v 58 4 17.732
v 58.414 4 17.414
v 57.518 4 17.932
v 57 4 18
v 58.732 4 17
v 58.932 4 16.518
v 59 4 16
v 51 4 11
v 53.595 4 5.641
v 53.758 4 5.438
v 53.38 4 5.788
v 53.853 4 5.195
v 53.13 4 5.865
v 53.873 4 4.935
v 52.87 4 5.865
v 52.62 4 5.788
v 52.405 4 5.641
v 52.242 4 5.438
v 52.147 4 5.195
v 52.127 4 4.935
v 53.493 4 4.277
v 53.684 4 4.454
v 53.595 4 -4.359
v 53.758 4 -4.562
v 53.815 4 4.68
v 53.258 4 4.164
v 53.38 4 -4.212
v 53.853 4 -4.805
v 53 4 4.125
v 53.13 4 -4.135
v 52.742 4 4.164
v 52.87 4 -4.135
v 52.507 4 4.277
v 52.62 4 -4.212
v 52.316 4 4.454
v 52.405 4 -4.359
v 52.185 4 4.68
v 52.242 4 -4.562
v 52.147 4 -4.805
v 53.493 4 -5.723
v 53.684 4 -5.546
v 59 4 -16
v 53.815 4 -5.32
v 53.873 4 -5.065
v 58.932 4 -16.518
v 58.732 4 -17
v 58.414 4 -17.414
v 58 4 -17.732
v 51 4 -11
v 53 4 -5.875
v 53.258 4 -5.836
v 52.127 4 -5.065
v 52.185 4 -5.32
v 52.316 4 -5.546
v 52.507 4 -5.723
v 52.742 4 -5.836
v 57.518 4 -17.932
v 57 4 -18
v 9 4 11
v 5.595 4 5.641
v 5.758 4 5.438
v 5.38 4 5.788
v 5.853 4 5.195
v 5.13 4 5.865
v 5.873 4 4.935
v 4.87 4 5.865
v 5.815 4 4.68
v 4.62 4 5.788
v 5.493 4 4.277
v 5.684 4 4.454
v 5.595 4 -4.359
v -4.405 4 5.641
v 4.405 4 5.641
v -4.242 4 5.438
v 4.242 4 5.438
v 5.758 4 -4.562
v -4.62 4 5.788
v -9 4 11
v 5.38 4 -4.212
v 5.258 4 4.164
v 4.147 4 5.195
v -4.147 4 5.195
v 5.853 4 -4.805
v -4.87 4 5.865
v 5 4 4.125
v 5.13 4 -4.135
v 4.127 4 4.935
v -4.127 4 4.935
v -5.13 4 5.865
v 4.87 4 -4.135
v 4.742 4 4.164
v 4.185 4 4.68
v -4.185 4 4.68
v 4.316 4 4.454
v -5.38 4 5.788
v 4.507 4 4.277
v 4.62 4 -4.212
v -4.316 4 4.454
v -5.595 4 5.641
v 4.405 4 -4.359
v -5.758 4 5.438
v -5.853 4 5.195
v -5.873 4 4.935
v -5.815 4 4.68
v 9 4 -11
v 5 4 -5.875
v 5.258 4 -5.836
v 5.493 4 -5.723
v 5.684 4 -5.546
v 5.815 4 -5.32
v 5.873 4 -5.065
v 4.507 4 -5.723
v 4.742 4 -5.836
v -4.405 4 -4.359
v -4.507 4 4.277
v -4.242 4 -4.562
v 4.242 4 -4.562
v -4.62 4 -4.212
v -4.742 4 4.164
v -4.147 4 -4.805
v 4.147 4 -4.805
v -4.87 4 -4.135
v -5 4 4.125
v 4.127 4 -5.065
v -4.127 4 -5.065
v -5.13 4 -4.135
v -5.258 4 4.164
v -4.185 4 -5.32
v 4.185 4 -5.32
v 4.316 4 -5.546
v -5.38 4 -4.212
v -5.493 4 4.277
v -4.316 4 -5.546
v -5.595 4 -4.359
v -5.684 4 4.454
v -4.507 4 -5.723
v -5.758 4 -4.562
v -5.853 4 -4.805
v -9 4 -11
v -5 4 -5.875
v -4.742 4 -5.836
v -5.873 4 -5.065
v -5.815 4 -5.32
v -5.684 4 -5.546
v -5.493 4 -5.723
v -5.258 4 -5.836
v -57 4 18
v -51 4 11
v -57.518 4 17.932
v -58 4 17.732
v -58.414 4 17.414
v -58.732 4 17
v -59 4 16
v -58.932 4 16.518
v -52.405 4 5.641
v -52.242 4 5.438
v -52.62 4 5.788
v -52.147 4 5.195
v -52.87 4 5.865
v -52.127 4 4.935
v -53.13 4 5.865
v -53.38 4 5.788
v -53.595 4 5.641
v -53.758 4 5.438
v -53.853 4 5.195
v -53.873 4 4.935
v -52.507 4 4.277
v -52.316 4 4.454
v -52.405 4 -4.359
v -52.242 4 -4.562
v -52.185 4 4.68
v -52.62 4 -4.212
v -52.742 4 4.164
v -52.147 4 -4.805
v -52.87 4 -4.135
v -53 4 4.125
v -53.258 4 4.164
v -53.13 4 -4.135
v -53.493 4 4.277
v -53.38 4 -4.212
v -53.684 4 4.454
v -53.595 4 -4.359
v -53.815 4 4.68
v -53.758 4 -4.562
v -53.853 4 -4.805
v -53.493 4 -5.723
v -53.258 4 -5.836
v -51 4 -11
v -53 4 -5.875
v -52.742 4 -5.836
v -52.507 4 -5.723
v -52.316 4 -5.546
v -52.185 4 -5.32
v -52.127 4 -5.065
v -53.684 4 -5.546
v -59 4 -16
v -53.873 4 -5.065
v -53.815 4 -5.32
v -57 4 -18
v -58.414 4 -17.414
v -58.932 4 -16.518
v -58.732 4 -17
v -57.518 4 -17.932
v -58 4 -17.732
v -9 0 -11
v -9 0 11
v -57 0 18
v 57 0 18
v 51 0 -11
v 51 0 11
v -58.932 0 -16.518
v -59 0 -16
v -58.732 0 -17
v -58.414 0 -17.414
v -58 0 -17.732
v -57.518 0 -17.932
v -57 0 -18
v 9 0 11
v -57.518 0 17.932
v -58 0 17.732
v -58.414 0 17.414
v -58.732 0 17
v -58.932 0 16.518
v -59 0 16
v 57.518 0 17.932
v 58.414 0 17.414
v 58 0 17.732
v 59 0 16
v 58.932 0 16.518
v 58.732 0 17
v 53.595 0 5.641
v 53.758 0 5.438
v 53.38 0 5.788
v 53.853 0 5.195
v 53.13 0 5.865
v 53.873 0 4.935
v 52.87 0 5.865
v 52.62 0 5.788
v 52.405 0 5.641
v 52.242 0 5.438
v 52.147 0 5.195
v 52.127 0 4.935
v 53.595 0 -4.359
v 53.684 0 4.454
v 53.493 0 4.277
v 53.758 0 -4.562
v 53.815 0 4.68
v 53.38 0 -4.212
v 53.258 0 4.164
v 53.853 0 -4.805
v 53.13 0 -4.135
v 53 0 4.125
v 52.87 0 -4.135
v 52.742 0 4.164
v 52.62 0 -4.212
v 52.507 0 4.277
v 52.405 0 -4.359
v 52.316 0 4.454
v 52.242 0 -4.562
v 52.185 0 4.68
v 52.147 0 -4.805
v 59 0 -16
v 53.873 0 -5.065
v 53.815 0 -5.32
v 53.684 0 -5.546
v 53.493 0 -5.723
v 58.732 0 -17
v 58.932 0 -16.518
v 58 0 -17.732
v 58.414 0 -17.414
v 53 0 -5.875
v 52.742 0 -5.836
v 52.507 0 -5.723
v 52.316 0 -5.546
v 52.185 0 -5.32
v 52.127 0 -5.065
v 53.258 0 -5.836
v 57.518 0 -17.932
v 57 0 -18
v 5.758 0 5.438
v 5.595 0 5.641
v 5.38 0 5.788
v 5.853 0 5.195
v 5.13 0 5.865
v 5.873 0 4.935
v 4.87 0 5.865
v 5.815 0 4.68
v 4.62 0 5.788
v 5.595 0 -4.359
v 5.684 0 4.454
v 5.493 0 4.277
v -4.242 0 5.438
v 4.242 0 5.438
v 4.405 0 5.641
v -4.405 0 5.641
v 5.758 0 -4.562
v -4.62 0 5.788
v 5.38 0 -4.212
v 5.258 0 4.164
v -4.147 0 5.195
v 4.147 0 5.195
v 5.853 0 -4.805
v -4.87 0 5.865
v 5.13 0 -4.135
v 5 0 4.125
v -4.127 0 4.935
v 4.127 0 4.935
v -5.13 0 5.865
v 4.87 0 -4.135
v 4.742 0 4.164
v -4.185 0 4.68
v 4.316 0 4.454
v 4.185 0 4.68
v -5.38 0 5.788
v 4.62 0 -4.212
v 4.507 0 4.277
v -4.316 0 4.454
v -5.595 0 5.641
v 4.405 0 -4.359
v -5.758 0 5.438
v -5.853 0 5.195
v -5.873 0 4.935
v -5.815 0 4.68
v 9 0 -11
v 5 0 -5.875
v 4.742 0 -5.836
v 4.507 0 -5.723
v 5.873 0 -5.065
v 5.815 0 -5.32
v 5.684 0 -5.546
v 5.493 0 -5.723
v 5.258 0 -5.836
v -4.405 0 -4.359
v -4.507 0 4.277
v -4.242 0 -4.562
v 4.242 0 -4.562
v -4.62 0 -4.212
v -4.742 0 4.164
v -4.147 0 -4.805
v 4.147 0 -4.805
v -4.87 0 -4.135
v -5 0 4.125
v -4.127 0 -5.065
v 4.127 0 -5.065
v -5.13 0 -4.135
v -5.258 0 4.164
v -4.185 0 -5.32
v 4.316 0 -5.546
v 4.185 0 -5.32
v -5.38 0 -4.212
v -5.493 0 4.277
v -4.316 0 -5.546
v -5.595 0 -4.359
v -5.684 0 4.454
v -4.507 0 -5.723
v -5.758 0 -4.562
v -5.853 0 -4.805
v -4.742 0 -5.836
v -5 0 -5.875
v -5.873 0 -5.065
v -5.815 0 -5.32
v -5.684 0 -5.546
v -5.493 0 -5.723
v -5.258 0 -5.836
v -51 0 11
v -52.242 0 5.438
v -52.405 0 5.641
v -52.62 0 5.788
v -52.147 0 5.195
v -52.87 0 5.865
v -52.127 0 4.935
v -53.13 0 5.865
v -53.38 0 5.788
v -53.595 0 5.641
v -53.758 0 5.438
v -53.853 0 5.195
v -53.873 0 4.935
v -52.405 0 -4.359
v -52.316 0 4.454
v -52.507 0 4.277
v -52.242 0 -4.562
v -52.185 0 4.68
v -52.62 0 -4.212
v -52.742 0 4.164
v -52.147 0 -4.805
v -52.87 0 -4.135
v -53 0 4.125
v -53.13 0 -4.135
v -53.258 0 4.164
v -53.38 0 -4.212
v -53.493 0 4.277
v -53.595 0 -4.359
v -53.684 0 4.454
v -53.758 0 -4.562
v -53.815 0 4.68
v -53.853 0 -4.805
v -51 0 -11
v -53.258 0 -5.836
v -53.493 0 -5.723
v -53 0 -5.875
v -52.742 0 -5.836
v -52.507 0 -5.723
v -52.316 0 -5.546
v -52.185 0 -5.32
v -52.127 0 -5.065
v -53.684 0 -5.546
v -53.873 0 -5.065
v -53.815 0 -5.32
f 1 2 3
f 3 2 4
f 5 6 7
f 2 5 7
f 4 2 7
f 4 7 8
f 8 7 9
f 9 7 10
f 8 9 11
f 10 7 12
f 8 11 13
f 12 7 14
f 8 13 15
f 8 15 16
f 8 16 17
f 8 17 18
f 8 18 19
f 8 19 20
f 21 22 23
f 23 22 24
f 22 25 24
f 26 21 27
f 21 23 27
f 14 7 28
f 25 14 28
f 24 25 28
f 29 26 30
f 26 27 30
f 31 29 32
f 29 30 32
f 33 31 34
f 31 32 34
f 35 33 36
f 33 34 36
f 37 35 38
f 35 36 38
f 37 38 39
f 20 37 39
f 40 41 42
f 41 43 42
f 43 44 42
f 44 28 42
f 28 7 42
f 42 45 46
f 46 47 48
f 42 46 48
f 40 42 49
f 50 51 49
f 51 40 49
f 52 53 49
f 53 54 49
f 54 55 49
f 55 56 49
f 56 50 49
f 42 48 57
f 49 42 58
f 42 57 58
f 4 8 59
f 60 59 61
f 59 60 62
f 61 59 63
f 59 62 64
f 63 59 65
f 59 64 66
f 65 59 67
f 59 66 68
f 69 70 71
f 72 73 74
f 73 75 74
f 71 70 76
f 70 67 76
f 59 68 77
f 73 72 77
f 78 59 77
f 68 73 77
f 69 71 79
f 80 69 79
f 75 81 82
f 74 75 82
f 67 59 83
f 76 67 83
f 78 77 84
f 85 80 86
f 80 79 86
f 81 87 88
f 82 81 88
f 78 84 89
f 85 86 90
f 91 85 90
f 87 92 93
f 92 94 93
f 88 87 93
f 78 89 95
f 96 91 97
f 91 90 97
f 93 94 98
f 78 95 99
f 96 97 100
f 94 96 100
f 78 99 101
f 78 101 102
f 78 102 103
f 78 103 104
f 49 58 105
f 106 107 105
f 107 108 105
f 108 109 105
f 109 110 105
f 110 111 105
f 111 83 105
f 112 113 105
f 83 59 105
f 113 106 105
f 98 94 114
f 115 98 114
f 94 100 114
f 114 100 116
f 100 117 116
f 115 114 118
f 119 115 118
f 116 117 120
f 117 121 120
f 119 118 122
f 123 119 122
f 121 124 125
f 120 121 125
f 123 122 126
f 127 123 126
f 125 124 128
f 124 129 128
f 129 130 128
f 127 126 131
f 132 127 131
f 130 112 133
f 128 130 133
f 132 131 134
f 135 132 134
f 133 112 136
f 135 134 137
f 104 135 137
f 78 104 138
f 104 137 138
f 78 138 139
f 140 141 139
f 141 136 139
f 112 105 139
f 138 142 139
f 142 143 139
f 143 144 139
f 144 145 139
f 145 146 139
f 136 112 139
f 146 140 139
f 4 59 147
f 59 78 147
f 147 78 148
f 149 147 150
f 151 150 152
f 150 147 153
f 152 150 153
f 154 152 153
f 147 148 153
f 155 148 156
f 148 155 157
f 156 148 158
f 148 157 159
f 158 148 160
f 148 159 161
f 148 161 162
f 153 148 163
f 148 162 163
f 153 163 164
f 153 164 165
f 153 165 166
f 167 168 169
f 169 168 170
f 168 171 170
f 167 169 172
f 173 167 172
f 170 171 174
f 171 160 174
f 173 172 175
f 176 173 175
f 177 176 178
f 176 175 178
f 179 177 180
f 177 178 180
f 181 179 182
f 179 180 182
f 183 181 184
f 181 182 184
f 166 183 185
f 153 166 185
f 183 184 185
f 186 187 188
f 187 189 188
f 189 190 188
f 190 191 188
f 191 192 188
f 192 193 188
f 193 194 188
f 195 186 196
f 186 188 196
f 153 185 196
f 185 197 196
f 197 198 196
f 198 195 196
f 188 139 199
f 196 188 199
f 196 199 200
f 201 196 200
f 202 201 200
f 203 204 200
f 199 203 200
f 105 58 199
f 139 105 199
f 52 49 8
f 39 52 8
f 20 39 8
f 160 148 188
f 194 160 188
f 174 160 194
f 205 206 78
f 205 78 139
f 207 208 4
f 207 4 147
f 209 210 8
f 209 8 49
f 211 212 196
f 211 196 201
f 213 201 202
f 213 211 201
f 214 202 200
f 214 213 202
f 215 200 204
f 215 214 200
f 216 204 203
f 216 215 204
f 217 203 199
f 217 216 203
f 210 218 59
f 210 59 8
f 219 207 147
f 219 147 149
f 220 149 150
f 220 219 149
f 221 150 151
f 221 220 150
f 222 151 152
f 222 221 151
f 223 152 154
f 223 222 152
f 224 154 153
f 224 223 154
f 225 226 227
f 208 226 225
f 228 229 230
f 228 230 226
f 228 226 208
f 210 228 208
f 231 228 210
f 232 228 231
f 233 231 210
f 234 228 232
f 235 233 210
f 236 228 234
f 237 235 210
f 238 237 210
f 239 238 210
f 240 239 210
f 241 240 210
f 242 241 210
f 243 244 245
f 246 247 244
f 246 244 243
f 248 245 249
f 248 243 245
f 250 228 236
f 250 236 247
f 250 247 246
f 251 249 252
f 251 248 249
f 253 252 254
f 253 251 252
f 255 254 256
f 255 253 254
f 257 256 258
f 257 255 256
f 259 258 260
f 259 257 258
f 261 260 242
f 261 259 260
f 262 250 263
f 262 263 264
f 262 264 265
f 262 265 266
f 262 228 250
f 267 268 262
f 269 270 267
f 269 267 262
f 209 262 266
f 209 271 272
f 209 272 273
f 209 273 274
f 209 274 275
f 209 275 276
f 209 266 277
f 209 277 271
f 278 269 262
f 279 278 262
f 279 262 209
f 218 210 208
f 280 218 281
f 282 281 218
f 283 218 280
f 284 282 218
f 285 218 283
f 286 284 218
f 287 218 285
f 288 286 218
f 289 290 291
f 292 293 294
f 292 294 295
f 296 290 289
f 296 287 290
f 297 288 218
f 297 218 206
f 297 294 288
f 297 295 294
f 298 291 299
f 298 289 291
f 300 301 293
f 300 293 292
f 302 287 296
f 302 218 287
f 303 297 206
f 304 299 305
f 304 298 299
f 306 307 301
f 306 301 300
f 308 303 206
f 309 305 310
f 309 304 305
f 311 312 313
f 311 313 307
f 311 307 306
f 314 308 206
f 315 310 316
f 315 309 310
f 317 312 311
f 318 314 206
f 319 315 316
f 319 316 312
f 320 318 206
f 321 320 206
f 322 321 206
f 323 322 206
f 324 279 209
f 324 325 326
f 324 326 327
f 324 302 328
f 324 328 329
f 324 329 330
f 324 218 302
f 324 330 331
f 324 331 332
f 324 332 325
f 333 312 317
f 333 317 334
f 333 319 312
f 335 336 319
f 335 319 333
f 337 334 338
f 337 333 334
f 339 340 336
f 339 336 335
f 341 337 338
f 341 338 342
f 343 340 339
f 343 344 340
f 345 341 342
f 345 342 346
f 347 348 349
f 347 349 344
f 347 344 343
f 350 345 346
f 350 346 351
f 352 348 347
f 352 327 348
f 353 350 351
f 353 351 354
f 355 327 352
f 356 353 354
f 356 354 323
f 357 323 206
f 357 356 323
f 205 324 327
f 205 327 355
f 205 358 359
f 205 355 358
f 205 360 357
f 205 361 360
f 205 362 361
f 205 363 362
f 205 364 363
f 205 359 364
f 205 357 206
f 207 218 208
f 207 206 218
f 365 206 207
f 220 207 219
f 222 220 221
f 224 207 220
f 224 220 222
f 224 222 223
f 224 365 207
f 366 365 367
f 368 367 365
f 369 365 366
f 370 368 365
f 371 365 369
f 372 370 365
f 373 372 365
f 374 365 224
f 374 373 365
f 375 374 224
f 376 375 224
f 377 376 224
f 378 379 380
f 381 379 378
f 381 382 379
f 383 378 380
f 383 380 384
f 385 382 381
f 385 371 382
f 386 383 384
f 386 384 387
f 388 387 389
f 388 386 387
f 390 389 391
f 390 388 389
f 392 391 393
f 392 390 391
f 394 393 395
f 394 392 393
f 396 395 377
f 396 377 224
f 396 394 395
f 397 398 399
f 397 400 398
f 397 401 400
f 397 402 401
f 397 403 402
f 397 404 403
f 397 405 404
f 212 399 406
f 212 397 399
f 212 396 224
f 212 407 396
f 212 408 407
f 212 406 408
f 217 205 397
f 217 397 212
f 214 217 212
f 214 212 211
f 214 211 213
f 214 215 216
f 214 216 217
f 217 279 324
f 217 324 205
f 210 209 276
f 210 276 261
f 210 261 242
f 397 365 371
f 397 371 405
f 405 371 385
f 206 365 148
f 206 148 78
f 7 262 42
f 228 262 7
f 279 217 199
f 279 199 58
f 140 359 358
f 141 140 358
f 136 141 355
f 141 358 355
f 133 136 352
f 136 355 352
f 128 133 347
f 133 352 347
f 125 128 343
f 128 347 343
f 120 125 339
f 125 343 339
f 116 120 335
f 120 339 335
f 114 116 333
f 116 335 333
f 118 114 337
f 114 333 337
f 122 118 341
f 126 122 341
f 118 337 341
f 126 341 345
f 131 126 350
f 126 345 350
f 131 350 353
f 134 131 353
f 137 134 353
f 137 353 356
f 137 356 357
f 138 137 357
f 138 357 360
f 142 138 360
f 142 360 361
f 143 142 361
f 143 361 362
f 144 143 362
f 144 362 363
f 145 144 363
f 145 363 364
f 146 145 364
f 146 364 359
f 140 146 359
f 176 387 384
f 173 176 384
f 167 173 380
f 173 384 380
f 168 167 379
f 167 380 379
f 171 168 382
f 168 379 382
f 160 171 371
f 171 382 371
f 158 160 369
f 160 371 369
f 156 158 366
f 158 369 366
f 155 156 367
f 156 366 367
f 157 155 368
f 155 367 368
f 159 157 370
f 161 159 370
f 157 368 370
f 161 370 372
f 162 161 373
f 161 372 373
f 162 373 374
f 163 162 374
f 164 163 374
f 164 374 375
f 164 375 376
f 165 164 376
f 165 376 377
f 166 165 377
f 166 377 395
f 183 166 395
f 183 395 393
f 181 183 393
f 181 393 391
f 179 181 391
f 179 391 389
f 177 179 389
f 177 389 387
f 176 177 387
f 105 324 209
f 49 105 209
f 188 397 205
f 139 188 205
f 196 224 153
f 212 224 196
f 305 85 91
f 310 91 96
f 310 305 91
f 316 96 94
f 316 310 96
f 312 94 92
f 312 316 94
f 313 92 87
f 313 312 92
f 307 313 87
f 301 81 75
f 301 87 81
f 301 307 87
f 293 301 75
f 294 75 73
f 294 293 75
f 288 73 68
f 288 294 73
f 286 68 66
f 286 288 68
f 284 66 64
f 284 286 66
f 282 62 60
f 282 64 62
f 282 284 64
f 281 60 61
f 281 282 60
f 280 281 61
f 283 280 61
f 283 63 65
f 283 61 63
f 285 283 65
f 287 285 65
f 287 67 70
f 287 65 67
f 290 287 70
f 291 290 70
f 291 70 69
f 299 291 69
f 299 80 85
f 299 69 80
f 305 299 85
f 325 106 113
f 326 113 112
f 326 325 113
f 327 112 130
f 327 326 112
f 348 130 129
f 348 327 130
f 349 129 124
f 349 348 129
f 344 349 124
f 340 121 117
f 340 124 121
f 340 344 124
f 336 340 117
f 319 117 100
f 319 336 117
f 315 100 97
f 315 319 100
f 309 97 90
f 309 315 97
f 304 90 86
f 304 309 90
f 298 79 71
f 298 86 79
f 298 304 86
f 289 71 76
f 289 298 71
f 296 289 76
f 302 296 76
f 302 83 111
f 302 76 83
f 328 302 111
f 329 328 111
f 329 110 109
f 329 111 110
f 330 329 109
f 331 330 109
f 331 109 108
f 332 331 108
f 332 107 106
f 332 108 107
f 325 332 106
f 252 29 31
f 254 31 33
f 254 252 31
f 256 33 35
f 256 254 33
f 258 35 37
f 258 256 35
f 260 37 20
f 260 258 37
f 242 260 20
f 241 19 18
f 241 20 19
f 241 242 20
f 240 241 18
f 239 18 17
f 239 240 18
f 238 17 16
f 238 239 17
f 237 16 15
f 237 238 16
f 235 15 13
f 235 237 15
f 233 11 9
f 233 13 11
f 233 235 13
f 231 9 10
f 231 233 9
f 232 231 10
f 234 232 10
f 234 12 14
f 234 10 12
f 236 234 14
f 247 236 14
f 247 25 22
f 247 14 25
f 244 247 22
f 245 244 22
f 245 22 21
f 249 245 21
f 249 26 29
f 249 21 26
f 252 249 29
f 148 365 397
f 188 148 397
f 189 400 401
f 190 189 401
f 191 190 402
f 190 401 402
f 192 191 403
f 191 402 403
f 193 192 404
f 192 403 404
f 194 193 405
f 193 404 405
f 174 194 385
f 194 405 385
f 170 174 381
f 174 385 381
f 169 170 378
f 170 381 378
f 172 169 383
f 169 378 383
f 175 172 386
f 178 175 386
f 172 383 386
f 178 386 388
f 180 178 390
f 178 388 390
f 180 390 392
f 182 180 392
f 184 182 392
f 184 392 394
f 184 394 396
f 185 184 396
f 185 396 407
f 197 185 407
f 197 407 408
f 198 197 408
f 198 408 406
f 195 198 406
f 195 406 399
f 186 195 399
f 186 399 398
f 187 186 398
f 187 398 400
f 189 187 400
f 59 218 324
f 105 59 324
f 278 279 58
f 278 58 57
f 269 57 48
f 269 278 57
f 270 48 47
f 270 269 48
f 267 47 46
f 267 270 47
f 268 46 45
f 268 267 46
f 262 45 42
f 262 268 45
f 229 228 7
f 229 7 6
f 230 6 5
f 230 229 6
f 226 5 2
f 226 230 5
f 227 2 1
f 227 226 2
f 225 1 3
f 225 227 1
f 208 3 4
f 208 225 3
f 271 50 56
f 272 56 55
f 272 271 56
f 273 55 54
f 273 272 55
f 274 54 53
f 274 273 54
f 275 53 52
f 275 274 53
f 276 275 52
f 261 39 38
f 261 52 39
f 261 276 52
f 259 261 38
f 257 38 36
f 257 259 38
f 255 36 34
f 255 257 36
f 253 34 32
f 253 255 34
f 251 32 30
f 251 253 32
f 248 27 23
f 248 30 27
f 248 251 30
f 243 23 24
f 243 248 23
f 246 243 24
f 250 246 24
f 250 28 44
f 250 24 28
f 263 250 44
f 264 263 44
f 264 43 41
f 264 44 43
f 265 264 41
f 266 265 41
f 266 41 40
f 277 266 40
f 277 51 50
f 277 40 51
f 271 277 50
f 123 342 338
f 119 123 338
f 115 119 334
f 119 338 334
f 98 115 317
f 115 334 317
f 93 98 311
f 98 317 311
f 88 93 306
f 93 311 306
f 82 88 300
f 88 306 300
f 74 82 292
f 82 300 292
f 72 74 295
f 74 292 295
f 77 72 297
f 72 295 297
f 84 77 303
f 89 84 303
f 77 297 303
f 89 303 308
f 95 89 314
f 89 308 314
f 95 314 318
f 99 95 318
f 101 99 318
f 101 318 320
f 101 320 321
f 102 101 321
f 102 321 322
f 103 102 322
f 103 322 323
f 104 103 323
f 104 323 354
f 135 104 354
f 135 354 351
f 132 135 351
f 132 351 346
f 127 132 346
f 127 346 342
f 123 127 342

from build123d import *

# Parameters (mm, degrees)
SKETCH2_W           = 42
SKETCH2_H           = 22
BOSS_EXTRUDE1_DEPTH = 4
SKETCH3_R           = 0.875
CUT_EXTRUDE1_DEPTH  = 10
SKETCH4_R           = 0.875
CUT_EXTRUDE2_DEPTH  = 10


with BuildPart() as part:
    # Sketch2 → Boss-Extrude1 (new body)
    with BuildSketch(Plane(origin=(0, 0, 0), x_dir=(1, 0, 0), z_dir=(0, 1, 0))):
        with BuildLine():
            Line((-57, 18), (57, 18))
            ThreePointArc((57, 18), (58.414213562, 17.414213562), (59, 16))
            Line((59, 16), (59, -16))
            ThreePointArc((59, -16), (58.414213562, -17.414213562), (57, -18))
            Line((57, -18), (-57, -18))
            ThreePointArc((-57, -18), (-58.414213562, -17.414213562), (-59, -16))
            Line((-59, -16), (-59, 16))
            ThreePointArc((-59, 16), (-58.414213562, 17.414213562), (-57, 18))
        make_face()
        with Locations((-30, 0)):
            Rectangle(SKETCH2_W, SKETCH2_H, mode=Mode.SUBTRACT)
        with Locations((30, 0)):
            Rectangle(SKETCH2_W, SKETCH2_H, mode=Mode.SUBTRACT)
    extrude(amount=BOSS_EXTRUDE1_DEPTH)

    # Sketch3 → Cut-Extrude1 (cut)
    with BuildSketch(Plane.XZ):
        with Locations(Location((-53, 5, 0), (0, 0, 270))):
            Circle(SKETCH3_R)
        with Locations(Location((-53, -5, 0), (0, 0, 270))):
            Circle(SKETCH3_R)
    cut_extrude1 = extrude(amount=-CUT_EXTRUDE1_DEPTH, mode=Mode.SUBTRACT)

    # Sketch4 → Cut-Extrude2 (cut)
    with BuildSketch(Plane.XZ):
        with Locations(Location((-5, 5, 0), (0, 0, 270))):
            Circle(SKETCH4_R)
        with Locations(Location((-5, -5, 0), (0, 0, 270))):
            Circle(SKETCH4_R)
    cut_extrude2 = extrude(amount=-CUT_EXTRUDE2_DEPTH, mode=Mode.SUBTRACT)

    # Mirror1: Cut-Extrude1, Cut-Extrude2 across plane
    add(cut_extrude1.mirror(Plane(origin=(0, 0, 0), x_dir=(0, 0, 1), z_dir=(1, 0, 0))), mode=Mode.SUBTRACT)
    add(cut_extrude2.mirror(Plane(origin=(0, 0, 0), x_dir=(0, 0, 1), z_dir=(1, 0, 0))), mode=Mode.SUBTRACT)


solid = part.part
